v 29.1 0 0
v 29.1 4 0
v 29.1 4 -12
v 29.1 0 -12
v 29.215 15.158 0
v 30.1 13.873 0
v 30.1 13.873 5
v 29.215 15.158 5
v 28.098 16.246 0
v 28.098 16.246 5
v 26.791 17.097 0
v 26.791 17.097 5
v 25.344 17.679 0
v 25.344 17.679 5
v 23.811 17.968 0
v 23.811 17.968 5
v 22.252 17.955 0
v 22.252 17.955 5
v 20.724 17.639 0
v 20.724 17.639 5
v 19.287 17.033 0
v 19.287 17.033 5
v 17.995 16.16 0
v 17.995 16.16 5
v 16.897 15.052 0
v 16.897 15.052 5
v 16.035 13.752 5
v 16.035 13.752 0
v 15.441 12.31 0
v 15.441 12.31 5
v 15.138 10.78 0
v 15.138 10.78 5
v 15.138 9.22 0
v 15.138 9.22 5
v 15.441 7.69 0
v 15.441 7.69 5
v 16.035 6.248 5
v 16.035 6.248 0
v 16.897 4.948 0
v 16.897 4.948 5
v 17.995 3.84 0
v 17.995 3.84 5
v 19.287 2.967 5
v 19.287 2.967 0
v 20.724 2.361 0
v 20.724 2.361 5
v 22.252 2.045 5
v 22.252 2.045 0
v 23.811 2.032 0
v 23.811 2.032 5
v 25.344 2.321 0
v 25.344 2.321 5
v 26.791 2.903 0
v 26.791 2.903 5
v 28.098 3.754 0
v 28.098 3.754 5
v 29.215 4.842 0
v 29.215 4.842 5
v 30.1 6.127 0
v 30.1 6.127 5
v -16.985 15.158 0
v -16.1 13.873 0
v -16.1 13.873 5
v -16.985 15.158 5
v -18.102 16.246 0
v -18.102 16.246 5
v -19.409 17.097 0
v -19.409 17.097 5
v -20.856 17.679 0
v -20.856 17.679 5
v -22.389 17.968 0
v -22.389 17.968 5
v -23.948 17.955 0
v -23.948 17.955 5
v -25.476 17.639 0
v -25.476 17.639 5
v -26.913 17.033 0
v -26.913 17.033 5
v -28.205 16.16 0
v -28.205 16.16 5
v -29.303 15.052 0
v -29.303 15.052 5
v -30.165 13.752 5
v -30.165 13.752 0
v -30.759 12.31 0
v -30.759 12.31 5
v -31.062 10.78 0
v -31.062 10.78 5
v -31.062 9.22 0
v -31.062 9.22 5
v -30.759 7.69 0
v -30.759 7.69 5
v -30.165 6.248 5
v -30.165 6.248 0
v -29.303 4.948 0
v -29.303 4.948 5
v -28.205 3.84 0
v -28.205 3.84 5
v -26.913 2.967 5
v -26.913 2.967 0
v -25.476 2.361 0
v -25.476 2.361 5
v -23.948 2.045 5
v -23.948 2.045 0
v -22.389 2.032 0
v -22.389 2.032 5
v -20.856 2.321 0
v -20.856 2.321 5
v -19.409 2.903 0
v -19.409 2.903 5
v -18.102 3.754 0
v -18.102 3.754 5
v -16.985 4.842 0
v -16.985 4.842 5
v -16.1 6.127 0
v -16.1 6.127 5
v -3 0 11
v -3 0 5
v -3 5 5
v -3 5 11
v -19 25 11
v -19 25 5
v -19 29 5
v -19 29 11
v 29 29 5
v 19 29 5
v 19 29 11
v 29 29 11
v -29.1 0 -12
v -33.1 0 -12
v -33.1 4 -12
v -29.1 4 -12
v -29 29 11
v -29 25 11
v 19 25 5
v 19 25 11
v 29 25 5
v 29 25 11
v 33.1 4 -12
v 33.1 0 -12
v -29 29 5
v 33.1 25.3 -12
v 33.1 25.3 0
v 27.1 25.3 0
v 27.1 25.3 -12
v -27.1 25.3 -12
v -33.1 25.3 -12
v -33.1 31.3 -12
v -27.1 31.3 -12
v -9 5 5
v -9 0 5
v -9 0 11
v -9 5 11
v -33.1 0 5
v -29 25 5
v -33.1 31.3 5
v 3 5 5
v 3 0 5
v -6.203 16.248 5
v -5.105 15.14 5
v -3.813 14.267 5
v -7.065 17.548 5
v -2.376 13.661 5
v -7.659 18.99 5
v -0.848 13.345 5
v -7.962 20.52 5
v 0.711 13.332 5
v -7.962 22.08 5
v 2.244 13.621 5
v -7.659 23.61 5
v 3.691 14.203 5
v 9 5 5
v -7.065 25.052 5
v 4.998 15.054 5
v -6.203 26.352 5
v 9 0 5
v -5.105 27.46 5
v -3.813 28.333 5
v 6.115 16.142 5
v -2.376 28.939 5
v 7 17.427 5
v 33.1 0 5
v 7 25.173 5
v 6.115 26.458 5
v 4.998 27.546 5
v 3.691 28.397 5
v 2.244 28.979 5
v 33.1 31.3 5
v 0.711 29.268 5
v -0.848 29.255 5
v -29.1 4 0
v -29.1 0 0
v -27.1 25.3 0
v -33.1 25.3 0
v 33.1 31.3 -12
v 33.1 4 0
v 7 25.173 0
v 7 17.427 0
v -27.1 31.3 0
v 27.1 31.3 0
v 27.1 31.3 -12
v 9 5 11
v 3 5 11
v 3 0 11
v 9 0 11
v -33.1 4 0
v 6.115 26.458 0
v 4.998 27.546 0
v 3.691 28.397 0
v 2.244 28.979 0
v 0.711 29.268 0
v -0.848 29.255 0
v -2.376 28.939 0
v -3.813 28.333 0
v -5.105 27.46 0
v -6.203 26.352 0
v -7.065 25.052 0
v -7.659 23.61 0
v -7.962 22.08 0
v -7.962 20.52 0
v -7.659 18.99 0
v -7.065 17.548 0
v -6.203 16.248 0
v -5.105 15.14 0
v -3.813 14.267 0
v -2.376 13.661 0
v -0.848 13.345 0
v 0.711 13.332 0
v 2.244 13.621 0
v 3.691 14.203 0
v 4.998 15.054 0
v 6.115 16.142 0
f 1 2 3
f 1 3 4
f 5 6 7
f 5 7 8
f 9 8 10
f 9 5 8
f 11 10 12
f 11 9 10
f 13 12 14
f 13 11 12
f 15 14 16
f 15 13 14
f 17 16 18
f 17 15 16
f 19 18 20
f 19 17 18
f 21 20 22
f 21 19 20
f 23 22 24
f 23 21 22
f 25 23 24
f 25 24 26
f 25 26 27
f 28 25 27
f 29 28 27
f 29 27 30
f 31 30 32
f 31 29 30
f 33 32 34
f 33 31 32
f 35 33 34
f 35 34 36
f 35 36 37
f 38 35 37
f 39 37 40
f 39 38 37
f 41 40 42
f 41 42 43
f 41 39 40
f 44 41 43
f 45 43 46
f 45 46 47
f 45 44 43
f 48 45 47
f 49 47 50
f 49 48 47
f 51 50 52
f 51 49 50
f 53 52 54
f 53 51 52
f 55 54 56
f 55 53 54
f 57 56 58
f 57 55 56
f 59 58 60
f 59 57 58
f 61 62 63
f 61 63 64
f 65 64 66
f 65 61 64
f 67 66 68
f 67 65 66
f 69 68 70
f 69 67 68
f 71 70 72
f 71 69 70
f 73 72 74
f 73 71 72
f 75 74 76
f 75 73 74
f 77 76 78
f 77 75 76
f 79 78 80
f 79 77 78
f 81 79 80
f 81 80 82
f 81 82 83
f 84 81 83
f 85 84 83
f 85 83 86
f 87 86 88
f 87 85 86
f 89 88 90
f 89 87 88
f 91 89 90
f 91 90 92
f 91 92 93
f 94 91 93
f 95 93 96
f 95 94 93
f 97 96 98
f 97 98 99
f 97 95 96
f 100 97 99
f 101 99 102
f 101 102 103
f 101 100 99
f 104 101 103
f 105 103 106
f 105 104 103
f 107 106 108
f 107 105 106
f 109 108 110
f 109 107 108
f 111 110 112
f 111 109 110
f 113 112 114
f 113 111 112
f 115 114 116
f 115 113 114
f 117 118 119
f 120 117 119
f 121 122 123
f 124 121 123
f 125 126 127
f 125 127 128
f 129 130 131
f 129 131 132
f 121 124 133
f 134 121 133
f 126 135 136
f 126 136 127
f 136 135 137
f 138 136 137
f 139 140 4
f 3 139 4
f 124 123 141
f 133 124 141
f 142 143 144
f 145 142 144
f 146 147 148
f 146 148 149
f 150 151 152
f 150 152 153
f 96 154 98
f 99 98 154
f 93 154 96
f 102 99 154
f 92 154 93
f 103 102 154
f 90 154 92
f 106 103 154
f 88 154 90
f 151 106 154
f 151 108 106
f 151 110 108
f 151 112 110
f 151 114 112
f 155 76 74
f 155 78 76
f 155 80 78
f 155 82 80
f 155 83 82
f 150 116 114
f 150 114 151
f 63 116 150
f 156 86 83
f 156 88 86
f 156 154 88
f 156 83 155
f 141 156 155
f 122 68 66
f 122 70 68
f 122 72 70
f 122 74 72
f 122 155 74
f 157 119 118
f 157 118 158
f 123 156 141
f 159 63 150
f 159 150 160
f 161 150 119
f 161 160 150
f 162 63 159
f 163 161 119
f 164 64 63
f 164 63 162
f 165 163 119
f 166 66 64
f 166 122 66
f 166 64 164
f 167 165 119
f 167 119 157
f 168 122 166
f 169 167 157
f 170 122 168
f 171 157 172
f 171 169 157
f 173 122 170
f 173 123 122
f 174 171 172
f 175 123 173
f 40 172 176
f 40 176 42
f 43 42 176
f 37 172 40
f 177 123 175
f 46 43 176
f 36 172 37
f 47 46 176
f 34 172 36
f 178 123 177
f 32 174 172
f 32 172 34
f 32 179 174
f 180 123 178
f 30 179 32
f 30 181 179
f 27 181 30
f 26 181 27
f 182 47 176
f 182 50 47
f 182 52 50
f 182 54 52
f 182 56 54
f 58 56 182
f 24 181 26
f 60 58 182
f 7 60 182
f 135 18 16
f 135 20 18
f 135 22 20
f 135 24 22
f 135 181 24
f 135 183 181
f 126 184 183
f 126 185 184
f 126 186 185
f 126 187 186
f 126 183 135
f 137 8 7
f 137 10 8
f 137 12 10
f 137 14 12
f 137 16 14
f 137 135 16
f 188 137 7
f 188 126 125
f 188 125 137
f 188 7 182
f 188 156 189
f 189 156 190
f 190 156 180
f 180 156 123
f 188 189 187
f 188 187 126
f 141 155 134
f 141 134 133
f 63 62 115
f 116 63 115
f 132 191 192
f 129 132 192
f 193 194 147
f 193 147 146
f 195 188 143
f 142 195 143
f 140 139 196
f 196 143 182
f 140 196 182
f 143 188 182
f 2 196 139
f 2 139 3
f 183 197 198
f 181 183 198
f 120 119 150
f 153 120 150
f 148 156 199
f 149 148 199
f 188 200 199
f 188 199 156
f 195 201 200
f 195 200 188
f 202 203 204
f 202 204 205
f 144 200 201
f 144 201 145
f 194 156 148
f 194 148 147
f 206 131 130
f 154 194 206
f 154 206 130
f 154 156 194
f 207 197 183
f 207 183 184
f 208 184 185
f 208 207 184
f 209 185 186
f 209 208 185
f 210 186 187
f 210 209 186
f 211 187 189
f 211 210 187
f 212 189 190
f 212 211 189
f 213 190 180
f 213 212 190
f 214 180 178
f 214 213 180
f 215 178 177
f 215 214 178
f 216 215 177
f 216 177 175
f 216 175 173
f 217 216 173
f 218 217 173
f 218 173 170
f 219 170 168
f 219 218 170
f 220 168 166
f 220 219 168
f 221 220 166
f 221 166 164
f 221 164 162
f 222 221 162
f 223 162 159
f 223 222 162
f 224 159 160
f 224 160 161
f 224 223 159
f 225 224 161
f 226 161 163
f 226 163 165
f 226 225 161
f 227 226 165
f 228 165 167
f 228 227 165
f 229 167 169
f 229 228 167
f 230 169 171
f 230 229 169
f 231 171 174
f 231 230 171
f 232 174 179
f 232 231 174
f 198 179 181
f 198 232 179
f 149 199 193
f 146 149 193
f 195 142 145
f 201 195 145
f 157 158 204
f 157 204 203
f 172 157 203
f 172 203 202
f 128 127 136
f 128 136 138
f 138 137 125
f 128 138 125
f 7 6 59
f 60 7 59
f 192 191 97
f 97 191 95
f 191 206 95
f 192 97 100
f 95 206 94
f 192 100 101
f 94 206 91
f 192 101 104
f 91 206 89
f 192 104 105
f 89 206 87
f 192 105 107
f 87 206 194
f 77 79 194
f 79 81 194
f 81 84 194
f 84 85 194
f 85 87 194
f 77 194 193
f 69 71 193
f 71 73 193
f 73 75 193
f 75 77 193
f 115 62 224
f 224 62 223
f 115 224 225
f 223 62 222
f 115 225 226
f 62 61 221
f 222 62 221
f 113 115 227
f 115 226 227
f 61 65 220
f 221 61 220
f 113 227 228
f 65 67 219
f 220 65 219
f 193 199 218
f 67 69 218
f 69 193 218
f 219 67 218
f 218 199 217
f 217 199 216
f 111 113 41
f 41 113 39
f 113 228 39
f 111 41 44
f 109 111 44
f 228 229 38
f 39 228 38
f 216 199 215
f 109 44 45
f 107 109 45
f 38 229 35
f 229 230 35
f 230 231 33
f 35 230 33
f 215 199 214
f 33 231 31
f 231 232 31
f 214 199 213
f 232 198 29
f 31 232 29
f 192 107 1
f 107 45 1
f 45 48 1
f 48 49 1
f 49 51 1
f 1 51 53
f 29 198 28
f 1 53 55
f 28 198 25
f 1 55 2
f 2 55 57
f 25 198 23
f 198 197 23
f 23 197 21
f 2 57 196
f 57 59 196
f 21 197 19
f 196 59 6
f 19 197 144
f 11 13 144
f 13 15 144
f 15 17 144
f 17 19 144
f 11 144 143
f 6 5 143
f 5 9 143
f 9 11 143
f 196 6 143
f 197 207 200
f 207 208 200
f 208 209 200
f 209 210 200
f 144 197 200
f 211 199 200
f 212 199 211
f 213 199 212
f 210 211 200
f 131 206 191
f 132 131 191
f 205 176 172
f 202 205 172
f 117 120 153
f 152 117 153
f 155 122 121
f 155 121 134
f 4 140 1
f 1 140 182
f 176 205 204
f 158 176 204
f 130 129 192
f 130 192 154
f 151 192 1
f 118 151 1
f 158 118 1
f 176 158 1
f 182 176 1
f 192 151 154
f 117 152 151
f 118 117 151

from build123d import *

# Parameters (mm, degrees)
SKETCH_W      = 66.2
SKETCH_H      = 31.3
PAD_DEPTH     = 5
SKETCH001_W   = 10
SKETCH001_H   = 4
SKETCH001_W_2 = 6
SKETCH001_H_2 = 5
PAD001_DEPTH  = 6
SKETCH002_W   = 4
SKETCH002_H   = 4
SKETCH002_W_2 = 6
SKETCH002_H_2 = 6
PAD002_DEPTH  = 12


with BuildPart() as part:
    # Sketch → Pad (new body)
    with BuildSketch(Plane.XY):
        with Locations((0, 15.65)):
            Rectangle(SKETCH_W, SKETCH_H)
        with BuildLine():
            ThreePointArc((-16.1, 13.872983), (-31.1, 10), (-16.1, 6.127017))
            Line((-16.1, 13.872983), (-16.1, 6.127017))
        make_face(mode=Mode.SUBTRACT)
        with BuildLine():
            ThreePointArc((30.1, 13.872983), (15.1, 10), (30.1, 6.127017))
            Line((30.1, 13.872983), (30.1, 6.127017))
        make_face(mode=Mode.SUBTRACT)
        with BuildLine():
            ThreePointArc((7, 25.172983), (-8, 21.3), (7, 17.427017))
            Line((7, 25.172983), (7, 17.427017))
        make_face(mode=Mode.SUBTRACT)
    extrude(amount=PAD_DEPTH)

    # Sketch001 (on Face12 of Pad) → Pad001 (join)
    with BuildSketch(Plane.XY.offset(5)):
        with Locations((24, 27)):
            Rectangle(SKETCH001_W, SKETCH001_H)
        with Locations((6, 2.5)):
            Rectangle(SKETCH001_W_2, SKETCH001_H_2)
    pad001 = extrude(amount=PAD001_DEPTH)

    # Mirrored: Pad001 across Sketch001 V_Axis
    add(pad001.mirror(Plane(origin=(0, 0, 5), x_dir=(0, 0, 1), z_dir=(1, 0, 0))))

    # Sketch002 (on Face3 of Mirrored) → Pad002 (join)
    with BuildSketch(Plane(origin=(0, 0, 0), x_dir=(1, 0, 0), z_dir=(0, 0, -1))):
        with Locations((-31.1, -2)):
            Rectangle(SKETCH002_W, SKETCH002_H)
        with Locations((-30.1, -28.3)):
            Rectangle(SKETCH002_W_2, SKETCH002_H_2)
    pad002 = extrude(amount=PAD002_DEPTH)

    # Mirrored001: Pad002 across Sketch002 V_Axis
    add(pad002.mirror(Plane(origin=(0, 0, 0), x_dir=(0, 0, -1), z_dir=(1, 0, 0))))


solid = part.part
